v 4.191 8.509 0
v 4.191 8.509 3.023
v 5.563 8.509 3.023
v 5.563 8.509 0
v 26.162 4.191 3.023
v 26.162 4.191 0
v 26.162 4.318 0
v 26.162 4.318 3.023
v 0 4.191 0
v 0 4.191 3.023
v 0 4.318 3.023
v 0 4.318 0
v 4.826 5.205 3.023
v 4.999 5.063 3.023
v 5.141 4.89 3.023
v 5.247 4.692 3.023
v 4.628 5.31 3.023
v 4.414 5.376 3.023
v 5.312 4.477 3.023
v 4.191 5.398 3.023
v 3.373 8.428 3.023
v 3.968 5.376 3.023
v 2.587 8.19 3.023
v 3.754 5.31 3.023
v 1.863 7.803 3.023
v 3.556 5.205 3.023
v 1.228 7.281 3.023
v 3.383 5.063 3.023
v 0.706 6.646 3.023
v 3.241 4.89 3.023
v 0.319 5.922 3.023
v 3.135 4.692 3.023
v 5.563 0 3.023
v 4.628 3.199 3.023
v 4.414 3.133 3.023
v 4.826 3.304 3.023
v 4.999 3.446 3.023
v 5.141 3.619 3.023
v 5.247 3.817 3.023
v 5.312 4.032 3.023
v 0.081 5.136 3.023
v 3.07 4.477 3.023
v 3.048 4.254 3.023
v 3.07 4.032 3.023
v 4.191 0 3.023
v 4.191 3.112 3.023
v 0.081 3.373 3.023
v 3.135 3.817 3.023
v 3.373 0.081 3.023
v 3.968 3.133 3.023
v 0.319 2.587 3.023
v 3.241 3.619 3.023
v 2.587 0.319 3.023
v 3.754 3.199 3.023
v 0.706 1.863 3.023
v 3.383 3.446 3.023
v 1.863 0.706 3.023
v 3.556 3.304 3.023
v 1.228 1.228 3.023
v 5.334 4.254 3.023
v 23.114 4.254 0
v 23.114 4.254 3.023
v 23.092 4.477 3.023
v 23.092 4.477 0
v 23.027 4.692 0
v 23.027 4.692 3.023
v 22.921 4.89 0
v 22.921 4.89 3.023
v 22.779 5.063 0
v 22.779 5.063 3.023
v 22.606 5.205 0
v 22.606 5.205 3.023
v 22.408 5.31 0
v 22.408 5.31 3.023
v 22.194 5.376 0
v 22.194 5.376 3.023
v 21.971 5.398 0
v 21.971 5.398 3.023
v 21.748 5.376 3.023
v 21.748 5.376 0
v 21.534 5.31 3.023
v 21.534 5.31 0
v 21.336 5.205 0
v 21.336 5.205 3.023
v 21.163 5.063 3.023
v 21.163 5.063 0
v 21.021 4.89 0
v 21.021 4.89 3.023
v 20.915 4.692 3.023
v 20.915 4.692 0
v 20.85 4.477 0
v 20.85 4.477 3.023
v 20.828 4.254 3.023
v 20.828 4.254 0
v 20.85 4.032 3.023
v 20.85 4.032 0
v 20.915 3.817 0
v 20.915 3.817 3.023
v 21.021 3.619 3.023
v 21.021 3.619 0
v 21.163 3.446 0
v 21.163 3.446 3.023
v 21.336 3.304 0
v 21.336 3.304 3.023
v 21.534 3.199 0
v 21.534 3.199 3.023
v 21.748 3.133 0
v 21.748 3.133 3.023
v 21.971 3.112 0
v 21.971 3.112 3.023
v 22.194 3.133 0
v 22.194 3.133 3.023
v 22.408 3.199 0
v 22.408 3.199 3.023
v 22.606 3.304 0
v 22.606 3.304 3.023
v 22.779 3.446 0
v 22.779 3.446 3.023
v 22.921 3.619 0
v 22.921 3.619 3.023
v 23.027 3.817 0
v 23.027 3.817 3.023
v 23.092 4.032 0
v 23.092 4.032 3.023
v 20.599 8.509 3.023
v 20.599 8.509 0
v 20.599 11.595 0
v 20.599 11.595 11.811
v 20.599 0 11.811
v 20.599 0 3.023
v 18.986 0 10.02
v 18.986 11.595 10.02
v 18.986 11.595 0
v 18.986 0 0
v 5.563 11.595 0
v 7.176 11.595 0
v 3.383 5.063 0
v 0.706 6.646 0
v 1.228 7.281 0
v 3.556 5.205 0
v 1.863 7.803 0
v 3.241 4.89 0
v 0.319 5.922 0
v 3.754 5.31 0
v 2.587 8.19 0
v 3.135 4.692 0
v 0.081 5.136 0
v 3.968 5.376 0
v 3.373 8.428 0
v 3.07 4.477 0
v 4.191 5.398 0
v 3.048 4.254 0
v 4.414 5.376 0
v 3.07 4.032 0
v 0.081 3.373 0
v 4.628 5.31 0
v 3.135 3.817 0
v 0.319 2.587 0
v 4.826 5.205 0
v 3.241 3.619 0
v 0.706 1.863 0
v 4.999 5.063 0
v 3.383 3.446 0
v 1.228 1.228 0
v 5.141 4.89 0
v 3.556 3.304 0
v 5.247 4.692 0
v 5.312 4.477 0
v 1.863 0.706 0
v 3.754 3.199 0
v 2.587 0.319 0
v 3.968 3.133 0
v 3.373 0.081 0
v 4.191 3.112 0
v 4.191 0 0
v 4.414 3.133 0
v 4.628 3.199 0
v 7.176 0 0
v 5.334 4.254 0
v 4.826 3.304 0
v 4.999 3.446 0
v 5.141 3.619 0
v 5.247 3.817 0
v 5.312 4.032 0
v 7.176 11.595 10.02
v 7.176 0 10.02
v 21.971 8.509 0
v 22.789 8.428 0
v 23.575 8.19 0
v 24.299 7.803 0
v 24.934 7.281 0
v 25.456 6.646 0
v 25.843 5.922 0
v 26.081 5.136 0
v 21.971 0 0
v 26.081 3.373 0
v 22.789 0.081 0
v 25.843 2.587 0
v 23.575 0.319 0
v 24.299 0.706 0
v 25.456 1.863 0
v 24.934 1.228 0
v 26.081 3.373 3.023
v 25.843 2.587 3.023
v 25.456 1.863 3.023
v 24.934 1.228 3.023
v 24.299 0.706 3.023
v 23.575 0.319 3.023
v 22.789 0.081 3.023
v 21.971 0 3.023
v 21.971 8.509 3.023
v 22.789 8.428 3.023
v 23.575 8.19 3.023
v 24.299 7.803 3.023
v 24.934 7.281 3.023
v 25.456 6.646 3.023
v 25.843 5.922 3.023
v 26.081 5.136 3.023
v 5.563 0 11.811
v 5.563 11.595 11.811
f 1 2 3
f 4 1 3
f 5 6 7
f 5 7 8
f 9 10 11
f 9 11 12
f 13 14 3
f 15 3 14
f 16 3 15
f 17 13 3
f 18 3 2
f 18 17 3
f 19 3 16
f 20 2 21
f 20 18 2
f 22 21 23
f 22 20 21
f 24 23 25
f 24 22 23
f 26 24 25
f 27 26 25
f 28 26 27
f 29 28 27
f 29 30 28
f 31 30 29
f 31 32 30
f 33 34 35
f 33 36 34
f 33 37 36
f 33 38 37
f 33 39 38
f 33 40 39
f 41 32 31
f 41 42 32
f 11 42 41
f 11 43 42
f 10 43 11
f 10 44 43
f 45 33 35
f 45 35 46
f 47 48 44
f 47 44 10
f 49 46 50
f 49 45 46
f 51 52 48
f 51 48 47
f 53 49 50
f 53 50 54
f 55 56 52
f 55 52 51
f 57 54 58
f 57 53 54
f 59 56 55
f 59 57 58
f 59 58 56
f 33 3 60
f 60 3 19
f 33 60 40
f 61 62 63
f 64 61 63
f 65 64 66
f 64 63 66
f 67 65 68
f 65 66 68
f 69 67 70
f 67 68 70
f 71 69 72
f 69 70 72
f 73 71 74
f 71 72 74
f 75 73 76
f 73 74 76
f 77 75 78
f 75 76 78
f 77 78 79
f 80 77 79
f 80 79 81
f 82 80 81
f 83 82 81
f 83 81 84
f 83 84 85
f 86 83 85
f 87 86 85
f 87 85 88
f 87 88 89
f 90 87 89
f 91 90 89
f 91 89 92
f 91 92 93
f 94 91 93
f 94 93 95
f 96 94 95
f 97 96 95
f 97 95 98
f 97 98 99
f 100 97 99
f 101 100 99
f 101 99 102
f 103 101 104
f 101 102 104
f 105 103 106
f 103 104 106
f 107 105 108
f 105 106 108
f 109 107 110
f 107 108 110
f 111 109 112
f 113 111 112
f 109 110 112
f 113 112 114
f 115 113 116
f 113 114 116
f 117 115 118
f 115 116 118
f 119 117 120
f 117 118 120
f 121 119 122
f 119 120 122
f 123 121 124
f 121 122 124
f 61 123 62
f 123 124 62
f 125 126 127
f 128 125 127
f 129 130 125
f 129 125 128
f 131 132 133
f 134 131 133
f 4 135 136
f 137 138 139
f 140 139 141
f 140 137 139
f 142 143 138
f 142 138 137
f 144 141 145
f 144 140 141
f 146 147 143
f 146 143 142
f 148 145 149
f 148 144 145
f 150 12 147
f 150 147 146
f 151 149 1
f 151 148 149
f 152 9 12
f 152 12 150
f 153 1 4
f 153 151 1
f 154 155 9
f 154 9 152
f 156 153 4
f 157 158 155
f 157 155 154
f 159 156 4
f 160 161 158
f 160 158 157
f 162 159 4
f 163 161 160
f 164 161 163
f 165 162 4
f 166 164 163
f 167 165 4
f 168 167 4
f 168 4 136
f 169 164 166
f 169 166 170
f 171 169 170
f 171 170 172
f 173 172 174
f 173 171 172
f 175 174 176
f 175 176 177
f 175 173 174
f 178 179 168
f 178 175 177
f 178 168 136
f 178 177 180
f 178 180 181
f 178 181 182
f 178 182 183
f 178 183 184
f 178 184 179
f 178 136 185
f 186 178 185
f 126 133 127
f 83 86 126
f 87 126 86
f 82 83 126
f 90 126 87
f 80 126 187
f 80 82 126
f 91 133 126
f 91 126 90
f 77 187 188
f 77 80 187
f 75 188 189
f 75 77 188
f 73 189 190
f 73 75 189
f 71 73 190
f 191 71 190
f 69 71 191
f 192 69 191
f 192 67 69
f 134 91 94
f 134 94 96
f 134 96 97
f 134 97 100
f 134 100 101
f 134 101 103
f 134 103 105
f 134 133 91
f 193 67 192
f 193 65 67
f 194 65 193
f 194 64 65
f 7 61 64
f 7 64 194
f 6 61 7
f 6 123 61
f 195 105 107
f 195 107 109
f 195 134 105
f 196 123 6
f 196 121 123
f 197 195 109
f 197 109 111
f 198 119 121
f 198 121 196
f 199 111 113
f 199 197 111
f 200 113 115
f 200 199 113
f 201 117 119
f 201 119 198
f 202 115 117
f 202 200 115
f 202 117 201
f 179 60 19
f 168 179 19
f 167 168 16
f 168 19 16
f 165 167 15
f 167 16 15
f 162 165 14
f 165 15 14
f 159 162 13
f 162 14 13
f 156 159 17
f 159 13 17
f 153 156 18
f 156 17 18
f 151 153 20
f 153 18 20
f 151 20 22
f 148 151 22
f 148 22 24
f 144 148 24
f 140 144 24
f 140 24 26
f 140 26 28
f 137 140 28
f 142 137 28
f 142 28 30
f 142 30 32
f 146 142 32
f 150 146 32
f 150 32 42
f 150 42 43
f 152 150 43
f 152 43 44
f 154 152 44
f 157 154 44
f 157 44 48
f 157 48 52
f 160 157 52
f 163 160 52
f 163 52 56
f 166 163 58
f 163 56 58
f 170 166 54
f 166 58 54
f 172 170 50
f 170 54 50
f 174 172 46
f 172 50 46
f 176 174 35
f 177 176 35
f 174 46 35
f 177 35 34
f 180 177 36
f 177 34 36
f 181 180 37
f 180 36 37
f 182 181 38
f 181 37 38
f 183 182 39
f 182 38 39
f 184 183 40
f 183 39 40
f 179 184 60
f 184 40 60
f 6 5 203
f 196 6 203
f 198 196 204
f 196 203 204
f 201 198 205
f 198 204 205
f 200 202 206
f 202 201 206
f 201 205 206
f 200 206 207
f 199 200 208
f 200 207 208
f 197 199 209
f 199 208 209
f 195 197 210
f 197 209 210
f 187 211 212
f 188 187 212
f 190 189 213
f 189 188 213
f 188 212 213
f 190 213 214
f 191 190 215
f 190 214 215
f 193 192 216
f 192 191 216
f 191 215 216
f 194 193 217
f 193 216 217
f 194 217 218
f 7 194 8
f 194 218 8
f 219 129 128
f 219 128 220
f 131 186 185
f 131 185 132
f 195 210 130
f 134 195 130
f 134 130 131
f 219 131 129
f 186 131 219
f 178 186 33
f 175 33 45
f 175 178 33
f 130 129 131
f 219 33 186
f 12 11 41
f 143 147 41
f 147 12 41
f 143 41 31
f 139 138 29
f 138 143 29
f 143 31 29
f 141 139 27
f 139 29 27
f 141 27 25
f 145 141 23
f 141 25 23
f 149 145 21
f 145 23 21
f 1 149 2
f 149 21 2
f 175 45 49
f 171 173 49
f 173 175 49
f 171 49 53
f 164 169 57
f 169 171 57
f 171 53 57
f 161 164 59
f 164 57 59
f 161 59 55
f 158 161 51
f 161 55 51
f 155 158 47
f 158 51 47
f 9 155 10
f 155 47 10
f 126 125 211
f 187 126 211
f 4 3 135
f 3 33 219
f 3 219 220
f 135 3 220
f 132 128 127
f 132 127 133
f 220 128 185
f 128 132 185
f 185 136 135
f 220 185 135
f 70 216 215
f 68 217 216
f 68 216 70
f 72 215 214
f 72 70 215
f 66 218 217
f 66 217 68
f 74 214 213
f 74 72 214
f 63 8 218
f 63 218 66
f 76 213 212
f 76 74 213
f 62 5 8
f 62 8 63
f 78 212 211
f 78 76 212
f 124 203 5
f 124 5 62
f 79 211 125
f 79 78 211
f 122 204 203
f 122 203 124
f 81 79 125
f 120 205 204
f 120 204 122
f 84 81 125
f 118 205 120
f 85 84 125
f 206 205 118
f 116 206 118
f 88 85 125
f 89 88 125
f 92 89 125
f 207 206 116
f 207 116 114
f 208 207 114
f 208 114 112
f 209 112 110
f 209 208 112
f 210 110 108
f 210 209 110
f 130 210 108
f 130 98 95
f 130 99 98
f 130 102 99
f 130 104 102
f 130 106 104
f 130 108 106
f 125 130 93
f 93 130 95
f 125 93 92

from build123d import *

# Parameters (mm, degrees)
BOSS_EXTRUDE1_DEPTH = 11.5951
CUT_EXTRUDE4_DEPTH  = 31.957976501
SKETCH4_R           = 1.143
CUT_EXTRUDE5_DEPTH  = 30.935473315


with BuildPart() as part:
    # Sketch1 → Boss-Extrude1 (new body)
    with BuildSketch(Plane(origin=(0, 0, 0), x_dir=(1, 0, 0), z_dir=(0, 1, 0))):
        Polygon((0, 0), (7.1755, 0), (7.1755, -10.0203), (18.9865, -10.0203), (18.9865, 0), (26.162, 0), (26.162, -3.0226), (20.5994, -3.0226), (20.5994, -11.811), (5.5626, -11.811), (5.5626, -3.0226), (0, -3.0226), align=None)
    extrude(amount=BOSS_EXTRUDE1_DEPTH)

    # Sketch2 → Cut-Extrude4 (cut, through all)
    with BuildSketch(Plane.XY.offset(11.811)):
        with BuildLine():
            Line((5.5626, 8.509), (5.5626, 11.5951))
            Line((5.5626, 11.5951), (0, 11.5951))
            Line((0, 11.5951), (0, 4.318))
            ThreePointArc((0, 4.318), (1.22751548, 7.28148452), (4.191, 8.509))
            Line((4.191, 8.509), (5.5626, 8.509))
        make_face()
        with BuildLine():
            ThreePointArc((4.191, 0), (1.22751548, 1.22751548), (0, 4.191))
            Line((0, 4.191), (0, 0))
            Line((0, 0), (4.191, 0))
        make_face()
        with BuildLine():
            Line((26.162, 11.5951), (20.5994, 11.5951))
            Line((20.5994, 11.5951), (20.5994, 8.509))
            Line((20.5994, 8.509), (21.971, 8.509))
            ThreePointArc((21.971, 8.509), (24.93448452, 7.28148452), (26.162, 4.318))
            Line((26.162, 4.318), (26.162, 11.5951))
        make_face()
        with BuildLine():
            Line((26.162, 0), (26.162, 4.191))
            ThreePointArc((26.162, 4.191), (24.93448452, 1.22751548), (21.971, 0))
            Line((21.971, 0), (26.162, 0))
        make_face()
    extrude(amount=-CUT_EXTRUDE4_DEPTH, mode=Mode.SUBTRACT)

    # Sketch4 → Cut-Extrude5 (cut, through all)
    with BuildSketch(Plane.XY.offset(3.0226)):
        with Locations((4.191, 4.2545)):
            Circle(SKETCH4_R)
        with Locations((21.971, 4.2545)):
            Circle(SKETCH4_R)
    extrude(amount=-CUT_EXTRUDE5_DEPTH, mode=Mode.SUBTRACT)


solid = part.part
